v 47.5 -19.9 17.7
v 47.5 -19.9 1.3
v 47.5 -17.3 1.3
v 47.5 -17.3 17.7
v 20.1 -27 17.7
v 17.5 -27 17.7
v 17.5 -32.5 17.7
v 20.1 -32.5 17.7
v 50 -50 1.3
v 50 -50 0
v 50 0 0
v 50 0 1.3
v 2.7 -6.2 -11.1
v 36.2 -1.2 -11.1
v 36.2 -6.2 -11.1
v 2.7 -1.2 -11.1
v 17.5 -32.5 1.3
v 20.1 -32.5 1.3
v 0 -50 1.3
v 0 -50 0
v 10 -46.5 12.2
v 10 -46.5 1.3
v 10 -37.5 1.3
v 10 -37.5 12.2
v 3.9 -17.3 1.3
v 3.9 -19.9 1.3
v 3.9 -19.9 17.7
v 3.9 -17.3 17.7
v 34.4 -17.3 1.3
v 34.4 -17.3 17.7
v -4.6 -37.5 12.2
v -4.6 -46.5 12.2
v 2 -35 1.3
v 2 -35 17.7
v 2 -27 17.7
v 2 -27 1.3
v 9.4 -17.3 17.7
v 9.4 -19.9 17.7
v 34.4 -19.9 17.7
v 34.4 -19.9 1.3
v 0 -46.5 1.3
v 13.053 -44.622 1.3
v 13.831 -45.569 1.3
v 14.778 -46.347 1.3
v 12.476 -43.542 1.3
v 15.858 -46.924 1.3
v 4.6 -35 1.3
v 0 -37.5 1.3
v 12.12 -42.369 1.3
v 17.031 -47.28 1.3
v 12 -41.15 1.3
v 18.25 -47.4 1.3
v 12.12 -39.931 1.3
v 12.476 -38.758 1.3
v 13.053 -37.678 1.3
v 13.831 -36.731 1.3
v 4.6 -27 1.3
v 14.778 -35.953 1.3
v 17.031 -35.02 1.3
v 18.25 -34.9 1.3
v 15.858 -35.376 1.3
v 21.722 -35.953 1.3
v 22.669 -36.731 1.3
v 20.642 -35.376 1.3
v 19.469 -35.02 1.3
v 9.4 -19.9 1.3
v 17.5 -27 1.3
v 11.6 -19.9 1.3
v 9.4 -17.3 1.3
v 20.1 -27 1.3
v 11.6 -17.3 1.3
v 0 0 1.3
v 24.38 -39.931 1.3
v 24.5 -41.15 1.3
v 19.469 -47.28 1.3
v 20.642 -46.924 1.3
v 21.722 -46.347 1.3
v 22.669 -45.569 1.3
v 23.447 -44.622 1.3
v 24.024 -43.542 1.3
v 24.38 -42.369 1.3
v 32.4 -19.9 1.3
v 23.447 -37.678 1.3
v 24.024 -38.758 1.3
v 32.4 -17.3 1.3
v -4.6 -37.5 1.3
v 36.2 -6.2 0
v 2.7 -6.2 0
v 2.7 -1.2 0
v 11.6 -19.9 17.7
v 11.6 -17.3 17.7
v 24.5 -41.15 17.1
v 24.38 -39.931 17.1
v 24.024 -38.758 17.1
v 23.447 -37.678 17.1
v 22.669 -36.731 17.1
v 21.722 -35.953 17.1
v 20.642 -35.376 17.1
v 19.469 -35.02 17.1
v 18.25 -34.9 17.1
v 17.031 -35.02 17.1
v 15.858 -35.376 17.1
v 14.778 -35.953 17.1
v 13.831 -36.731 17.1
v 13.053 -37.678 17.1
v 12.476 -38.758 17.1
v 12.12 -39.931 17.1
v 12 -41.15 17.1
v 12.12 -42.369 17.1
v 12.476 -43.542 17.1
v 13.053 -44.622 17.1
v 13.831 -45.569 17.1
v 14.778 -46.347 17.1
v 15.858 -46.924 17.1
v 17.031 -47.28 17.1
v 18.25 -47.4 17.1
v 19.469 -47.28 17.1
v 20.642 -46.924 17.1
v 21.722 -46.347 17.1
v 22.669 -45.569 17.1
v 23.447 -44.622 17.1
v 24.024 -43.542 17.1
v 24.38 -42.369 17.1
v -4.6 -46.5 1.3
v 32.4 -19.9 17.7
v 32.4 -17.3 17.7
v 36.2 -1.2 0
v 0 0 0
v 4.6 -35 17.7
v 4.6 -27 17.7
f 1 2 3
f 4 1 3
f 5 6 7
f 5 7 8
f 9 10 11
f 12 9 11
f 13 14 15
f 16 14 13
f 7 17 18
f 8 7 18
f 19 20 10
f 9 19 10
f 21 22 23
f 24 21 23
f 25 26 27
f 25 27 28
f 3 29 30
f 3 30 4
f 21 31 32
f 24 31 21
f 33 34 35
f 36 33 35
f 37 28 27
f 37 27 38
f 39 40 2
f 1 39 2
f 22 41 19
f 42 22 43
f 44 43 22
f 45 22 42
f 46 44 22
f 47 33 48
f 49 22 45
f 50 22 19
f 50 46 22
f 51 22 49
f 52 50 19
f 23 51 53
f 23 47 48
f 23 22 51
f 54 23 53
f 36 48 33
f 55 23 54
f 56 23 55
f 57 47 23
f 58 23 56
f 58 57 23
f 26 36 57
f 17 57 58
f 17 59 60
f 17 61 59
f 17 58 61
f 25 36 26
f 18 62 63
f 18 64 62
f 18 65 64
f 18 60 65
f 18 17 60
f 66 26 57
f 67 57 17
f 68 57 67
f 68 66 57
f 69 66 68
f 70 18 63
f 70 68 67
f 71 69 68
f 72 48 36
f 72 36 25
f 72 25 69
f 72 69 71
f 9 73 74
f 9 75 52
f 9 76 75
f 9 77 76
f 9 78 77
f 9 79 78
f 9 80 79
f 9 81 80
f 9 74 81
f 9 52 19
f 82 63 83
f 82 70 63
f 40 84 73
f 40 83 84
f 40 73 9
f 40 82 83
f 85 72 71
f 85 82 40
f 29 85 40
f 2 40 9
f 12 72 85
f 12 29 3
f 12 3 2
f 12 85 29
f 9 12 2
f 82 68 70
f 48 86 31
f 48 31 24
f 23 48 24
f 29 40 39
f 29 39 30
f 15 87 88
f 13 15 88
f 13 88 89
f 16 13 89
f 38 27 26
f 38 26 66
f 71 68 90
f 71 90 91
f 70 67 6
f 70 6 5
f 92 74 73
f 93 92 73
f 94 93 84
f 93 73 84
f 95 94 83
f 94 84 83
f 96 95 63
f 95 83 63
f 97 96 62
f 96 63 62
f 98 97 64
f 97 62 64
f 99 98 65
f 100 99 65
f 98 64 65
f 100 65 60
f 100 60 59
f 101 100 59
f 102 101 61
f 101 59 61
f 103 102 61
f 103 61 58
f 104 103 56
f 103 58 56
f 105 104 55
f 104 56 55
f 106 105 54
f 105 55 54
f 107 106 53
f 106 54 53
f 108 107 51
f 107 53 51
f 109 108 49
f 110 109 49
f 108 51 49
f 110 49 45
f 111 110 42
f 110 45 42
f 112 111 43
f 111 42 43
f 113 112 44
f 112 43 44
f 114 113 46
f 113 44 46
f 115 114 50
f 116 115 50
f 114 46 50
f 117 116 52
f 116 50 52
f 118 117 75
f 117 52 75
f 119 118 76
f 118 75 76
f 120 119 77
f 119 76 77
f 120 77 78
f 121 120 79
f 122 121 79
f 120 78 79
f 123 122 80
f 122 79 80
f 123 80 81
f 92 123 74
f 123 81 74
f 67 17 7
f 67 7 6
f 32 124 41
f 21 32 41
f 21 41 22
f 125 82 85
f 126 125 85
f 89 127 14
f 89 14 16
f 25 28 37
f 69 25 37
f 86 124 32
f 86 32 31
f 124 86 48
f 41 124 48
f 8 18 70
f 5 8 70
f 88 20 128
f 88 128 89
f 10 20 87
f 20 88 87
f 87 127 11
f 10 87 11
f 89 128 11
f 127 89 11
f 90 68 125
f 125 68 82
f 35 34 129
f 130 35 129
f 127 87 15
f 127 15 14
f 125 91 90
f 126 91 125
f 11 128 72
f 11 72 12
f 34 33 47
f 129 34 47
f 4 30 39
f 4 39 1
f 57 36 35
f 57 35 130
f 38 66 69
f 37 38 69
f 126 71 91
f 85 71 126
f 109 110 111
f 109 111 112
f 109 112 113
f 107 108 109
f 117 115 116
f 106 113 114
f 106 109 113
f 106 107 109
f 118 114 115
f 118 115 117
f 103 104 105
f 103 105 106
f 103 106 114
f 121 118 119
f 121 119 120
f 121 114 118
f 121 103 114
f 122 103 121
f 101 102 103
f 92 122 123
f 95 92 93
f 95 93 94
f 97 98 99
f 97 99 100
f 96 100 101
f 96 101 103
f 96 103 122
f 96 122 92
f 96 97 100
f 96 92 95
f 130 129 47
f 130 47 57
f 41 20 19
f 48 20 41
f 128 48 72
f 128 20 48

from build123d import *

# Parameters (mm, degrees)
CROQUIS1_W              = 50
CROQUIS1_H              = 50
SALIENTE_EXTRUIR1_DEPTH = 1.3
CROQUIS2_W              = 33.5
CROQUIS2_H              = 5
SALIENTE_EXTRUIR2_DEPTH = 11.1
CROQUIS3_W              = 14.6
CROQUIS3_H              = 9
SALIENTE_EXTRUIR3_DEPTH = 10.9
CROQUIS4_R              = 6.25
SALIENTE_EXTRUIR4_DEPTH = 15.8
CROQUIS5_W              = 13.1
CROQUIS5_H              = 2.6
CROQUIS5_W_2            = 20.8
CROQUIS5_W_3            = 5.5
CROQUIS5_W_4            = 2.6
CROQUIS5_H_2            = 8
CROQUIS5_H_3            = 5.5
SALIENTE_EXTRUIR5_DEPTH = 16.4


with BuildPart() as part:
    # Croquis1 → Saliente-Extruir1 (new body)
    with BuildSketch(Plane.XY):
        with Locations((25, -25)):
            Rectangle(CROQUIS1_W, CROQUIS1_H)
    extrude(amount=SALIENTE_EXTRUIR1_DEPTH)

    # Croquis2 → Saliente-Extruir2 (add)
    with BuildSketch(Plane(origin=(0, 0, 0), x_dir=(-1, 0, 0), z_dir=(0, 0, -1))):
        with Locations((-19.45, -3.7)):
            Rectangle(CROQUIS2_W, CROQUIS2_H)
    extrude(amount=SALIENTE_EXTRUIR2_DEPTH)

    # Croquis3 → Saliente-Extruir3 (add)
    with BuildSketch(Plane.XY.offset(1.3)):
        with Locations((2.7, -42)):
            Rectangle(CROQUIS3_W, CROQUIS3_H)
    extrude(amount=SALIENTE_EXTRUIR3_DEPTH)

    # Croquis4 → Saliente-Extruir4 (add)
    with BuildSketch(Plane.XY.offset(1.3)):
        with Locations((18.25, -41.15)):
            Circle(CROQUIS4_R)
    extrude(amount=SALIENTE_EXTRUIR4_DEPTH)

    # Croquis5 → Saliente-Extruir5 (add)
    with BuildSketch(Plane.XY.offset(1.3)):
        with Locations((40.95, -18.6)):
            Rectangle(CROQUIS5_W, CROQUIS5_H)
        with Locations((22, -18.6)):
            Rectangle(CROQUIS5_W_2, CROQUIS5_H)
        with Locations((6.65, -18.6)):
            Rectangle(CROQUIS5_W_3, CROQUIS5_H)
        with Locations((3.3, -31)):
            Rectangle(CROQUIS5_W_4, CROQUIS5_H_2)
        with Locations((18.8, -29.75)):
            Rectangle(CROQUIS5_W_4, CROQUIS5_H_3)
    extrude(amount=SALIENTE_EXTRUIR5_DEPTH)


solid = part.part
